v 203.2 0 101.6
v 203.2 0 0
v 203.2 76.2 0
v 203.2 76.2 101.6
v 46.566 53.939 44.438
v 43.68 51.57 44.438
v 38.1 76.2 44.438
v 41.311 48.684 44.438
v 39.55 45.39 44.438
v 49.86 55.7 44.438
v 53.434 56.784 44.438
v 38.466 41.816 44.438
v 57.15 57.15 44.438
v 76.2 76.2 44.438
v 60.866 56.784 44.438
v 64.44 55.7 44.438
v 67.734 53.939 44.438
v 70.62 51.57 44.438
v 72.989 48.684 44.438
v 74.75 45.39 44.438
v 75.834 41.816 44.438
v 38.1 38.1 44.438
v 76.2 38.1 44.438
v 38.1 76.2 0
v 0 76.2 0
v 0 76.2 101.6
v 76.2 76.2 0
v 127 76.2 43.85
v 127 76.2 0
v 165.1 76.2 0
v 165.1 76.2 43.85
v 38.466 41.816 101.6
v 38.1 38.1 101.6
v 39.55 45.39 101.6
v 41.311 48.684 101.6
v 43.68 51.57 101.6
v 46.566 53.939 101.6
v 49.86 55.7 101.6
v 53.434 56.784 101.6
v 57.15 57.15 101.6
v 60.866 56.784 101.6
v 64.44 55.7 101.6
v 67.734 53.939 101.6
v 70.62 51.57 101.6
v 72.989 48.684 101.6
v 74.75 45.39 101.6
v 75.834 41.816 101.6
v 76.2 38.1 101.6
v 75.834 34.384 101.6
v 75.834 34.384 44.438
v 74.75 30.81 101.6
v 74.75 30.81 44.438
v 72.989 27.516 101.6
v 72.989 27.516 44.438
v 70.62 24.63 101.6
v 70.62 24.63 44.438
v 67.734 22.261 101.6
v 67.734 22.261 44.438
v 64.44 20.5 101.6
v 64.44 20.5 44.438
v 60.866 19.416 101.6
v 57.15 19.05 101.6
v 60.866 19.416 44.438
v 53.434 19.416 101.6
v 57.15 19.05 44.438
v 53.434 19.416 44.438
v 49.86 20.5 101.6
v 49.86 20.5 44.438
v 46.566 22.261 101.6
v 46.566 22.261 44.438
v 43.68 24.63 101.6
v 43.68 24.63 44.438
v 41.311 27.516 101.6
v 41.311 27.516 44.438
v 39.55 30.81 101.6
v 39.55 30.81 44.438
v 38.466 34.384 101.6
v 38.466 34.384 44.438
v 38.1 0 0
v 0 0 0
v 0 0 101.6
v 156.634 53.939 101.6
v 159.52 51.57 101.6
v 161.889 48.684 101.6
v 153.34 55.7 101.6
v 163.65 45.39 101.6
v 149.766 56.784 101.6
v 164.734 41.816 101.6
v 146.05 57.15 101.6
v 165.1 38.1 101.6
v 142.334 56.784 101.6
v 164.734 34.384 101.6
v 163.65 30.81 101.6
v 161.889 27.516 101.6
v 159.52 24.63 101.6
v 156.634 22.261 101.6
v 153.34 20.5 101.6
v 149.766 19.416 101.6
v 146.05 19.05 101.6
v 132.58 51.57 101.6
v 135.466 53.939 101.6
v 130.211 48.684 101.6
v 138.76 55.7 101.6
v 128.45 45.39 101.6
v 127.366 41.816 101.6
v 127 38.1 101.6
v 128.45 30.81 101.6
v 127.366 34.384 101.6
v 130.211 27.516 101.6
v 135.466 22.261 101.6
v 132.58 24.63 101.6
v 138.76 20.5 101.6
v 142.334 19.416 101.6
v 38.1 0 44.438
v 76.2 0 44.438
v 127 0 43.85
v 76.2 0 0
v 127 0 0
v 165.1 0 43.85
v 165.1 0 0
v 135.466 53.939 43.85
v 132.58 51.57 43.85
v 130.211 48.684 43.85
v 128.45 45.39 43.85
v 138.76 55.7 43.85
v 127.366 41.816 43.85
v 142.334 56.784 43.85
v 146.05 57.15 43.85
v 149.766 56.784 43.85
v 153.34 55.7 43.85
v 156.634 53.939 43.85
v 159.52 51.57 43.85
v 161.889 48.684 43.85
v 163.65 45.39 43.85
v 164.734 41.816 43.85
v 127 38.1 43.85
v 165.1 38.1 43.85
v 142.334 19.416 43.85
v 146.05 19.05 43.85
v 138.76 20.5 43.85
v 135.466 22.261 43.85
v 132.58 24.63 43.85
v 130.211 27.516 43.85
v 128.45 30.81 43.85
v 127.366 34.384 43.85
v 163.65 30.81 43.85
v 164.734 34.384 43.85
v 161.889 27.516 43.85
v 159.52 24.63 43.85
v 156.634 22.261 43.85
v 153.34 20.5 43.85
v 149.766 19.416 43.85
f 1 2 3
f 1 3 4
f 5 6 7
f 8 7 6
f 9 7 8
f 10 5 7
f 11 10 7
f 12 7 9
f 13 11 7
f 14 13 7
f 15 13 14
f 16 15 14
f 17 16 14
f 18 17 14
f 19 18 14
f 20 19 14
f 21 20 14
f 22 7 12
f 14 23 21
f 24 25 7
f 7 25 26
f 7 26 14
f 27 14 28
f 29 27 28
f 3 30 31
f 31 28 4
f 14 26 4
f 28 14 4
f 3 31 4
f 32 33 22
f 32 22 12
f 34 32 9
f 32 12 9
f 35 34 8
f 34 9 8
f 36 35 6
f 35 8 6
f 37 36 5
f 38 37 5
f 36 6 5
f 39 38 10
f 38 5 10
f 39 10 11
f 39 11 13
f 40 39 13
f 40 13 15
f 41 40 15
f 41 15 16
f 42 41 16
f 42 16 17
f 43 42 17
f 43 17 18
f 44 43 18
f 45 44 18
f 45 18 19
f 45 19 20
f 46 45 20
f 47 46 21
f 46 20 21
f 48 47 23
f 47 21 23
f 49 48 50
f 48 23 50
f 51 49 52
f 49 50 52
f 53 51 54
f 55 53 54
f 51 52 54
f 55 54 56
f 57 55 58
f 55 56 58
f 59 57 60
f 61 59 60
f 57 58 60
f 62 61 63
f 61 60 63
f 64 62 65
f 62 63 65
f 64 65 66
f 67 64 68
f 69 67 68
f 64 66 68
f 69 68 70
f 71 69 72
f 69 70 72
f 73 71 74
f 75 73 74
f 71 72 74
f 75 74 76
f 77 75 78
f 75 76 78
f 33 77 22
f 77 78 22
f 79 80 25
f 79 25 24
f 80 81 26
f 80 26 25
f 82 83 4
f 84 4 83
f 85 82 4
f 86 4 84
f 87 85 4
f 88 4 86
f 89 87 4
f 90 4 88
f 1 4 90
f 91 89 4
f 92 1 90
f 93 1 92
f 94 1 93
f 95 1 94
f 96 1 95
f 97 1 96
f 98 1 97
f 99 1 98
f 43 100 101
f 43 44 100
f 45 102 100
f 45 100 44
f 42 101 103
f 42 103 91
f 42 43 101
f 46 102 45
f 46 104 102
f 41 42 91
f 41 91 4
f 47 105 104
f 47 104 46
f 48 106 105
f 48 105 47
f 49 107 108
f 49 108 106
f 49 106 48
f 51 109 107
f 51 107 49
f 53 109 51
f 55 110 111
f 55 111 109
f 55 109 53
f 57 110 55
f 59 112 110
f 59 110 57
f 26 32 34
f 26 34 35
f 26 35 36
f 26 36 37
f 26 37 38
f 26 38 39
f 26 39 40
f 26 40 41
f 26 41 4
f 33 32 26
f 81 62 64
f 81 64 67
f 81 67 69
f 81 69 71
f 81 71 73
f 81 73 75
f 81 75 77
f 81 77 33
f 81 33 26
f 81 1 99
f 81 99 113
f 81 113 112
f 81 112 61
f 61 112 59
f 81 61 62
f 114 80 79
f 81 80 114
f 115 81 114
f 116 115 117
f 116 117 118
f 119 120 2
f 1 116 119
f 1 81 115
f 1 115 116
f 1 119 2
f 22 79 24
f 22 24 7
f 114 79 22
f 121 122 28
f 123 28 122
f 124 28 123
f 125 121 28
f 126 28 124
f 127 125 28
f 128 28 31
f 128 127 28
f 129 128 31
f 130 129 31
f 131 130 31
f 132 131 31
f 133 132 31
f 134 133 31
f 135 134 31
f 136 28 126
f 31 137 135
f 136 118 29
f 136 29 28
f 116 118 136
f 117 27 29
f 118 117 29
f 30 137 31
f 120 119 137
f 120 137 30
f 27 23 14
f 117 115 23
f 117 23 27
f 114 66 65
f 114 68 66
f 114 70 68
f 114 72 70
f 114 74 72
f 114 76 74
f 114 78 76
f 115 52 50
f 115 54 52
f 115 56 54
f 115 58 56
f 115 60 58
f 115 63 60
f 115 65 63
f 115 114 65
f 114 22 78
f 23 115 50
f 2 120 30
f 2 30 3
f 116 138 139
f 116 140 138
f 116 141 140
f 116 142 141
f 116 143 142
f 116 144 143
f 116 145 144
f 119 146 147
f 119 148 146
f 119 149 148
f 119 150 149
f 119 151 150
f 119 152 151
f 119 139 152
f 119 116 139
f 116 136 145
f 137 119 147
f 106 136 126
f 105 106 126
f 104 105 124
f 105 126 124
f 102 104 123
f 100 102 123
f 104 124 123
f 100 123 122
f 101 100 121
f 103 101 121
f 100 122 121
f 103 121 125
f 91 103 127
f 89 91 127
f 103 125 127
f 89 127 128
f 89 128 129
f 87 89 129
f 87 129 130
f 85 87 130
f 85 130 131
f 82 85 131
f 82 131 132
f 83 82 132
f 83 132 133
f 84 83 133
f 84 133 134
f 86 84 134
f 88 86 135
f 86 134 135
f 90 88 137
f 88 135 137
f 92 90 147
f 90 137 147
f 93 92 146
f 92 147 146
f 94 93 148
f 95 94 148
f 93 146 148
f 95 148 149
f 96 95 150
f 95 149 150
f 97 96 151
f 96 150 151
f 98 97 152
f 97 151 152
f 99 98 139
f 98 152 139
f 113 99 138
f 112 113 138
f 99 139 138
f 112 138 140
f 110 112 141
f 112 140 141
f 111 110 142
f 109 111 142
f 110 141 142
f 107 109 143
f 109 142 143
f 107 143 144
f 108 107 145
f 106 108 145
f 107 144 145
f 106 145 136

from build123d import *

# Parameters (mm, degrees)
F1_DEPTH = 76.2
F3_D     = 38.1


with BuildPart() as f1:
    # F0 (on Front) → F1 (new body)
    with BuildSketch(Plane.XZ):
        Polygon((0, 101.6), (0, 0), (38.1, 0), (38.1, 44.437758), (76.2, 44.437758), (76.2, 0), (127, 0), (127, 43.850472), (165.1, 43.850472), (165.1, 0), (203.2, 0), (203.2, 101.6), align=None)
    extrude(amount=-F1_DEPTH)

    # F3 (through all)
    with Locations(Plane.XY.offset(101.6)):
        with Locations((57.15, 38.1), (146.05, 38.1)):
            Hole(F3_D / 2)


solid = f1.part
